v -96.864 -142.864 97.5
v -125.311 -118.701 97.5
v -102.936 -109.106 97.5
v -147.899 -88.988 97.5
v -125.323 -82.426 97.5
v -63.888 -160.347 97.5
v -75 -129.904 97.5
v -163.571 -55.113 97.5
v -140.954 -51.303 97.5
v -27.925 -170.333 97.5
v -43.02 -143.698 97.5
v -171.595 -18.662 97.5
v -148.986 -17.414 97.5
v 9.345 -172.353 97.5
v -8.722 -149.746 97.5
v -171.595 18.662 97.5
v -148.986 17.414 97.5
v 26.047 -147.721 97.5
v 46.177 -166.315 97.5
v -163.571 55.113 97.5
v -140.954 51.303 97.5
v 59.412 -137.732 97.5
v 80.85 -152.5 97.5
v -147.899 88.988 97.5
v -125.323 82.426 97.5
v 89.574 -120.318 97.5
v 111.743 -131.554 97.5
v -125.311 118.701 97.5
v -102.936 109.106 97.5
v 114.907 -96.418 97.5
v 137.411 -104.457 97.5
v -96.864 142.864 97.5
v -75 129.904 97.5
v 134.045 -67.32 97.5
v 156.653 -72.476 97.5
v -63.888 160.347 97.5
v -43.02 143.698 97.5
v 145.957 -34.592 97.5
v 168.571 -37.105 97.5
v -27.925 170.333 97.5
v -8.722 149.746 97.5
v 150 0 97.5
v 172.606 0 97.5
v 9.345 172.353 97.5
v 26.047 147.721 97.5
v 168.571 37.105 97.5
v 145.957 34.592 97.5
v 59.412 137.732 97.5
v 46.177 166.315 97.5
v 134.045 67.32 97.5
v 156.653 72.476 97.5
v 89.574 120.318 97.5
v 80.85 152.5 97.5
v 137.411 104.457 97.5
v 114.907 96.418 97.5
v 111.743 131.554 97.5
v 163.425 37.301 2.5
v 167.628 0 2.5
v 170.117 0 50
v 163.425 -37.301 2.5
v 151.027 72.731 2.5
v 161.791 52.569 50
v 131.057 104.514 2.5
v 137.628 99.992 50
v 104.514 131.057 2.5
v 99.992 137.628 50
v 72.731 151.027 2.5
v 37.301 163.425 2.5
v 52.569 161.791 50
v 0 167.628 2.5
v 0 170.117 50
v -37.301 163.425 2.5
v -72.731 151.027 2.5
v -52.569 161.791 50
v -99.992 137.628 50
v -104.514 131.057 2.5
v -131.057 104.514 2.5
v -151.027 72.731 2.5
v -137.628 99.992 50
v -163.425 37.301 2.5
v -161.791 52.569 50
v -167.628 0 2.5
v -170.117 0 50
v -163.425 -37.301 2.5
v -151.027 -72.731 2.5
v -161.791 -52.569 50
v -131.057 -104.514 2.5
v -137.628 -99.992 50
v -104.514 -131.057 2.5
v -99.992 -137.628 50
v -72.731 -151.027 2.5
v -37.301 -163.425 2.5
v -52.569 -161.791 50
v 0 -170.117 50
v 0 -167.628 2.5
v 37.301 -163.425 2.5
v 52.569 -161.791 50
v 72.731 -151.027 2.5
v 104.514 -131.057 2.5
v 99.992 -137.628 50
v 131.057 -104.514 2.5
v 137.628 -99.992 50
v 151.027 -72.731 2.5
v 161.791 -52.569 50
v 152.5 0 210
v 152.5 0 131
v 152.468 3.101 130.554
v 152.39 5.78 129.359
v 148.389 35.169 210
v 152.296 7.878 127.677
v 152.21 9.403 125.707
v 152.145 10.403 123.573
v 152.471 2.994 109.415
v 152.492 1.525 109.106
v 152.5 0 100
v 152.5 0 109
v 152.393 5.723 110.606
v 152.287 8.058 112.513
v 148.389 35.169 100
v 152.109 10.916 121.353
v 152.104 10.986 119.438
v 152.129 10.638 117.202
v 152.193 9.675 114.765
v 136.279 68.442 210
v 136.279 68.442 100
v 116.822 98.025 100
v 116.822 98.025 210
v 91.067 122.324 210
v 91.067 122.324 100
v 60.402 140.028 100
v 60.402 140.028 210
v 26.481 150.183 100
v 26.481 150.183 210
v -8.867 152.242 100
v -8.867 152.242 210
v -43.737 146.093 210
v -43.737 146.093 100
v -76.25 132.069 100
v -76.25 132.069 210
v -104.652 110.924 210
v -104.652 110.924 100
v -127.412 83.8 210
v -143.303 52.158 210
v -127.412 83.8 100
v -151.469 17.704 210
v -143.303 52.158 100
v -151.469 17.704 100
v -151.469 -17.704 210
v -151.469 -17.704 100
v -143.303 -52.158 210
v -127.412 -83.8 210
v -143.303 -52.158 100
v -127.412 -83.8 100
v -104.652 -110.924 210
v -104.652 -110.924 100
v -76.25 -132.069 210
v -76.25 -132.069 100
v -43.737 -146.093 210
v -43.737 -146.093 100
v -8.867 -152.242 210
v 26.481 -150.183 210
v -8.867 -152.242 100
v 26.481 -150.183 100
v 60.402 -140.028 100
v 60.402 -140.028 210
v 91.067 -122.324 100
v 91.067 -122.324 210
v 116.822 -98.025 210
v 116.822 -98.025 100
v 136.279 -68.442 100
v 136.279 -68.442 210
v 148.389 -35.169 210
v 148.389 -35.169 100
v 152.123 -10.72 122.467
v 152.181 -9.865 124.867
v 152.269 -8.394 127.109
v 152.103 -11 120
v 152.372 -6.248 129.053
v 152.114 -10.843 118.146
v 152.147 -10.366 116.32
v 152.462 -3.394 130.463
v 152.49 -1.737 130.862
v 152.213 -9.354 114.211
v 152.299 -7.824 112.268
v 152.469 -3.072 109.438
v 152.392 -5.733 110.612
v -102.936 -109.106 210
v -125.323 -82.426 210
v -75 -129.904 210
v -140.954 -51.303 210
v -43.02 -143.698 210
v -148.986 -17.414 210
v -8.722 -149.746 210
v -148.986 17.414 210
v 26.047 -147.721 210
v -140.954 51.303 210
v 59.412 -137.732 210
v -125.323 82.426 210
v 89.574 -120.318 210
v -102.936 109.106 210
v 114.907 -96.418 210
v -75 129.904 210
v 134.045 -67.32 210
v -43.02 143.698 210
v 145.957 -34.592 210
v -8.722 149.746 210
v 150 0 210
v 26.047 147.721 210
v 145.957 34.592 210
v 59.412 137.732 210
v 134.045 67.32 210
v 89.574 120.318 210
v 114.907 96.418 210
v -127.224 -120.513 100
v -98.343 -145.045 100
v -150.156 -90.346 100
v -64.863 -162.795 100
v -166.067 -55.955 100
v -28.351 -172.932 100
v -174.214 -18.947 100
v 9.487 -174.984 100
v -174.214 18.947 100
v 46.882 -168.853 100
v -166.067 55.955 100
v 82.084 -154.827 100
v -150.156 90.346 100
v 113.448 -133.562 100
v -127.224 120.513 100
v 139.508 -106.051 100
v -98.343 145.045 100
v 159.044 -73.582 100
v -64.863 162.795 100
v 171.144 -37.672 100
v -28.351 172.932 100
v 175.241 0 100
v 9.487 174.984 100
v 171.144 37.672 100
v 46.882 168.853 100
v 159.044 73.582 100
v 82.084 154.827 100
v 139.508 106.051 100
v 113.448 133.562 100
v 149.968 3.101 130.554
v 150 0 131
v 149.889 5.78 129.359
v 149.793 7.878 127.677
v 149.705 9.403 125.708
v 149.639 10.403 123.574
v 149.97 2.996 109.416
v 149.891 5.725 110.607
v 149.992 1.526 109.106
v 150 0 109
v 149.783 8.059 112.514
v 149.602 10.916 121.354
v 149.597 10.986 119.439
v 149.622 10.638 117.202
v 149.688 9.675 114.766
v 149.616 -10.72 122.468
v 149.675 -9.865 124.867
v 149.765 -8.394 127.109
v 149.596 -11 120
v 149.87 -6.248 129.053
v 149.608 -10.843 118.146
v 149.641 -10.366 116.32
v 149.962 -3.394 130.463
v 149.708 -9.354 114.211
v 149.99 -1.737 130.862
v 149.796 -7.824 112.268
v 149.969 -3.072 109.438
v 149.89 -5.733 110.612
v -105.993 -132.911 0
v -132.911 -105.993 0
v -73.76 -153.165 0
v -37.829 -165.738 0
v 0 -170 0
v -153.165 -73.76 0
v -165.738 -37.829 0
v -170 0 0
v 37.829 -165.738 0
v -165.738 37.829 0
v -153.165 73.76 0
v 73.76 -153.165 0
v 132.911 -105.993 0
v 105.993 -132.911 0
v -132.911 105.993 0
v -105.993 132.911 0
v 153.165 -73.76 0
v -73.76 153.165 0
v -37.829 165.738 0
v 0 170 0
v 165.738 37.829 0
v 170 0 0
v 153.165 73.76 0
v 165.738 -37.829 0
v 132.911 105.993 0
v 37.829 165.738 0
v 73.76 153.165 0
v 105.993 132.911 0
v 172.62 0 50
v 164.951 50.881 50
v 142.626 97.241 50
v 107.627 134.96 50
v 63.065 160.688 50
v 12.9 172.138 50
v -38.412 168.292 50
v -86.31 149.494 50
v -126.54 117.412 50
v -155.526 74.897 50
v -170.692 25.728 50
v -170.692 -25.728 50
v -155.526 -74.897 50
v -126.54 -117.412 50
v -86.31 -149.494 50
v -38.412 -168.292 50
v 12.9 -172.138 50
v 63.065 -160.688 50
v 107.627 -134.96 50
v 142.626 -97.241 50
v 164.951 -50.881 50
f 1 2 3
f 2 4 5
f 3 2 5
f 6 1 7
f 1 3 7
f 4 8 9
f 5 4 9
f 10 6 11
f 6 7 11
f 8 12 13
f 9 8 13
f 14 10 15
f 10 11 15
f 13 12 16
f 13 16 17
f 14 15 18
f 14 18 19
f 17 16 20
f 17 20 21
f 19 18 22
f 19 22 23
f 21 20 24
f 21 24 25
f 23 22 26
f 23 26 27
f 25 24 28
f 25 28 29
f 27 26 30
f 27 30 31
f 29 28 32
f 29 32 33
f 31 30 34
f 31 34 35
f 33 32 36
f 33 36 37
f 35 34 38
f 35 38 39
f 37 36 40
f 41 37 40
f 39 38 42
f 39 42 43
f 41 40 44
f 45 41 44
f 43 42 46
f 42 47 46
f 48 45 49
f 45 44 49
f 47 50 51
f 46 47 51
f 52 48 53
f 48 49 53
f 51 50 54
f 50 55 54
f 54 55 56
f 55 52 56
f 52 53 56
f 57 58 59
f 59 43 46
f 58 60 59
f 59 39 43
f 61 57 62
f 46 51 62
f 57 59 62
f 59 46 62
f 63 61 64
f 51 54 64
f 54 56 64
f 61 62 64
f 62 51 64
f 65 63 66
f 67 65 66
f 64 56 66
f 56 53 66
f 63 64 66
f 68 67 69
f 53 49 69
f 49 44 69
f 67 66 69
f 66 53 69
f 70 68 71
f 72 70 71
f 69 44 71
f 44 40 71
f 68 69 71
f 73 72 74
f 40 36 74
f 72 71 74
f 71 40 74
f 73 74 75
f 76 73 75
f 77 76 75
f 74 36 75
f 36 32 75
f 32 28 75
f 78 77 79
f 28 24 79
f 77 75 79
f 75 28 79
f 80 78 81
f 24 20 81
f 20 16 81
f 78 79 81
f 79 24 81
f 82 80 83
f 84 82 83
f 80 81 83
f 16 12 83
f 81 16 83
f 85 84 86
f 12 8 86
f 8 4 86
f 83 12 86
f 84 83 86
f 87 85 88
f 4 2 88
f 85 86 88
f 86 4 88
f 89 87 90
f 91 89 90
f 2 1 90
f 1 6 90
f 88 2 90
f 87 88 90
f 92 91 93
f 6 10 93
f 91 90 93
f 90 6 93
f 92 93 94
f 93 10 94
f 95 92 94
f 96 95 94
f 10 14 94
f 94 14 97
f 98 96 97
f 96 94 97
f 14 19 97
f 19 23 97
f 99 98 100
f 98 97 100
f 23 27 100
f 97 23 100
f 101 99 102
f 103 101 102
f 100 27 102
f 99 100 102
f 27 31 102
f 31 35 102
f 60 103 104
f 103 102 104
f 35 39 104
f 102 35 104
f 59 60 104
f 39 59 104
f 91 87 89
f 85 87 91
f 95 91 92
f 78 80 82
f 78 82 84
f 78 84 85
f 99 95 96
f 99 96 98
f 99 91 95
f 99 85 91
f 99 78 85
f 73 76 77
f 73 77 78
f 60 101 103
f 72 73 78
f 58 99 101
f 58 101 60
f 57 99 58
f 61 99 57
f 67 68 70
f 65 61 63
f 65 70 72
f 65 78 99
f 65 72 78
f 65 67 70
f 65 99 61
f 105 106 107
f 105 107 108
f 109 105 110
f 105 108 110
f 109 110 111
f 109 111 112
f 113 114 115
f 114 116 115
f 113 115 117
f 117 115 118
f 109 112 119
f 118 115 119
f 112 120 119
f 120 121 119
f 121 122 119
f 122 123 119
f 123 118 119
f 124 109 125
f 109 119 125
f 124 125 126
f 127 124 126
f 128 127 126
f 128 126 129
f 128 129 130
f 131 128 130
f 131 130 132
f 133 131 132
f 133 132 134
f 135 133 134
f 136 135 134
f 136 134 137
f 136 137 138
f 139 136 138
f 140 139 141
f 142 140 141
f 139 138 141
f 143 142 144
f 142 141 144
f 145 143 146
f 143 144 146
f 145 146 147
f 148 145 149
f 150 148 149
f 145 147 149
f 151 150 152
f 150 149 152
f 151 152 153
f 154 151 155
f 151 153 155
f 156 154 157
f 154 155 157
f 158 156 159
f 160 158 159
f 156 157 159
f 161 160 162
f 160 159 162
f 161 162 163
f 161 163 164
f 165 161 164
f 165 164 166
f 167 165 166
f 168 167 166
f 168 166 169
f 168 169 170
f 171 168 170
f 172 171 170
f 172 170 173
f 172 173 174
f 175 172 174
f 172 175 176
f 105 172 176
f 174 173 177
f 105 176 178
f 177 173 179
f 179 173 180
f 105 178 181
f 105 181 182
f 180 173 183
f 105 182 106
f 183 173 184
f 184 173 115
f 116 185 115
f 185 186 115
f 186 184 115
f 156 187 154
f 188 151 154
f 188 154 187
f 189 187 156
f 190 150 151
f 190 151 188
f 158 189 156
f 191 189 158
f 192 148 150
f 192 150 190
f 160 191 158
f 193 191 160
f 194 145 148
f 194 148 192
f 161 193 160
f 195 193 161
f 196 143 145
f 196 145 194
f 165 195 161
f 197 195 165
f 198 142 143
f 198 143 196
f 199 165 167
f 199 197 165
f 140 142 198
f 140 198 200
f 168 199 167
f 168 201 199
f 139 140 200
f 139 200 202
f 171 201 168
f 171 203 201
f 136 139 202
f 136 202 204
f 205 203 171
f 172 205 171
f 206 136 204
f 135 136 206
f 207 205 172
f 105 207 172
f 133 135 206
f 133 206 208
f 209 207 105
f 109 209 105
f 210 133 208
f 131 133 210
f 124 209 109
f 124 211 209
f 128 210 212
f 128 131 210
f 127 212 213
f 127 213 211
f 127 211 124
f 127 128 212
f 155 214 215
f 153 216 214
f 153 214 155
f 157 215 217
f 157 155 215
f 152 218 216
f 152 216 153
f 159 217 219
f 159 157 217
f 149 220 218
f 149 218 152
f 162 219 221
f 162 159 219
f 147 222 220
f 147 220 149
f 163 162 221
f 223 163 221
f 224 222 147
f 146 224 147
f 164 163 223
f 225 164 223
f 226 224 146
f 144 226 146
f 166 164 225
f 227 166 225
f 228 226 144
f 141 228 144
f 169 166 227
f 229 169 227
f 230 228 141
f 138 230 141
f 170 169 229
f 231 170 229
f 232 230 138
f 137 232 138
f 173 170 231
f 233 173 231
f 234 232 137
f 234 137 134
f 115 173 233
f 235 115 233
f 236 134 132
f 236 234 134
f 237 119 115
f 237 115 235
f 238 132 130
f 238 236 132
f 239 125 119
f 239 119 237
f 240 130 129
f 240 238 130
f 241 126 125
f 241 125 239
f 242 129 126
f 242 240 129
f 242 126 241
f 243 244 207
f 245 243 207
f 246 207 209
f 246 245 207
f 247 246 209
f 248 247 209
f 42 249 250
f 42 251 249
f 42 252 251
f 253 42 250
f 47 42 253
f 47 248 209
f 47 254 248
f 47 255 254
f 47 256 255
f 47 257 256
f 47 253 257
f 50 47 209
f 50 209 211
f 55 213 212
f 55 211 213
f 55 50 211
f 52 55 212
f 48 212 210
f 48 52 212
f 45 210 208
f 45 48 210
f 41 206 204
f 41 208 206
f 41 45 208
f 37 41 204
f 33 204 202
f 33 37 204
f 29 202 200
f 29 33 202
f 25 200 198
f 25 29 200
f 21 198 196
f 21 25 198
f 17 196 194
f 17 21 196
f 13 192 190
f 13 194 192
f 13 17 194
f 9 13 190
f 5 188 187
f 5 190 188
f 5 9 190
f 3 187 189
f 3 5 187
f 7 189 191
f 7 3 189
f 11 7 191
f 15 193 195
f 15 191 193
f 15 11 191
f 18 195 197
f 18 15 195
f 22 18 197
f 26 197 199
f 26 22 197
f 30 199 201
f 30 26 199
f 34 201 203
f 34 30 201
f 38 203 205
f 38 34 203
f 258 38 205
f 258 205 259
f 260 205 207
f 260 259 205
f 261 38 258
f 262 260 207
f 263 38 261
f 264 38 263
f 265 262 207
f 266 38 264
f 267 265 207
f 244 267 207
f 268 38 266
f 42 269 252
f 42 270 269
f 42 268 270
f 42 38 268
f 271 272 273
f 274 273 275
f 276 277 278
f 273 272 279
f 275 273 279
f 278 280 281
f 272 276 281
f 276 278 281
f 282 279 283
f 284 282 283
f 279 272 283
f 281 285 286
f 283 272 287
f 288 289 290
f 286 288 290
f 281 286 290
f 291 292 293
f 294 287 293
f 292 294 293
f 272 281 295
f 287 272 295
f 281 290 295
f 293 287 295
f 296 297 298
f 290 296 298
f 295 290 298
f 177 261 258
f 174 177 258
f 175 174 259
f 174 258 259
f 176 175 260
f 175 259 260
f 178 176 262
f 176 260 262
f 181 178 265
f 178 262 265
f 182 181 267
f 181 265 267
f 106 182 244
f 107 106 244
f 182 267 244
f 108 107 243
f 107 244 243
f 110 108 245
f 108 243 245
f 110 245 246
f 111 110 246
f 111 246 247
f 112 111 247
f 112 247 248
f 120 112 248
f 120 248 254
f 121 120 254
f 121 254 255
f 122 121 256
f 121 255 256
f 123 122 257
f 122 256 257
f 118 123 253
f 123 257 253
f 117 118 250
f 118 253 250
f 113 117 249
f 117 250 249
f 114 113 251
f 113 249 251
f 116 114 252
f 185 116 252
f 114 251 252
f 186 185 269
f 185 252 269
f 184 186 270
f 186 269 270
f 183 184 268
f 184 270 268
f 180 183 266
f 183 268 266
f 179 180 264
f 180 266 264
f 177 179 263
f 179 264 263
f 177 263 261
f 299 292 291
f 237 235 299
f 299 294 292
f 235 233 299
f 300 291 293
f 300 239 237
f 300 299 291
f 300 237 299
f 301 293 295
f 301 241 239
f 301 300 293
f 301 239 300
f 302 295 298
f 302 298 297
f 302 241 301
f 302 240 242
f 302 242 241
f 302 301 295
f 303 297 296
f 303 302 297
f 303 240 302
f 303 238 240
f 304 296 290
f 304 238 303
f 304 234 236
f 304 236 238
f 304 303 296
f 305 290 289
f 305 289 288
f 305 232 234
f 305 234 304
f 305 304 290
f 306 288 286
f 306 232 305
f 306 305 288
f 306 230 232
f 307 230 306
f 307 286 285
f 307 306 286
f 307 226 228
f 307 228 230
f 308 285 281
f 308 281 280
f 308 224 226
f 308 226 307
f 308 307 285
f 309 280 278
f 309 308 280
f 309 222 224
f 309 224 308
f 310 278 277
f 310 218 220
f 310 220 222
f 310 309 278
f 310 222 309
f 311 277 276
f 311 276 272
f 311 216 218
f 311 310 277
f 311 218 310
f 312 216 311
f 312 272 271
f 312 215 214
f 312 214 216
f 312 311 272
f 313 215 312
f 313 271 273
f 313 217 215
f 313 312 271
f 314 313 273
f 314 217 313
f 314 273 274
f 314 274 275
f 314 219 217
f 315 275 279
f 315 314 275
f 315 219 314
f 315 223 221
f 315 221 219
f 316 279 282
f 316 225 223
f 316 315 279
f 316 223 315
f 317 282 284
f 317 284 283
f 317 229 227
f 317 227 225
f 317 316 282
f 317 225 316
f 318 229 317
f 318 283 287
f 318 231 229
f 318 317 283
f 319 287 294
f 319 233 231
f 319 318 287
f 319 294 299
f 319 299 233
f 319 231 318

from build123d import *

# Parameters (mm, degrees)
F0_R     = 170
F1_DEPTH = 100
F1_TAPER = -3
F7_R     = 152.5
F2_DEPTH = 110
F4_T     = -2.5
F6_D     = 22
F6_DEPTH = 200
F6_START = 47.8972388
F6_TIP   = 6.6094668093


with BuildPart() as f1:
    # F0 (on Top) → F1 (new body)
    with BuildSketch(Plane.XY):
        Circle(F0_R)
    extrude(amount=F1_DEPTH, taper=F1_TAPER)

    # F7 (on face) → F2 (join)
    with BuildSketch(Plane.XY.offset(100)):
        Circle(F7_R)
    extrude(amount=F2_DEPTH)

    # F4
    f4_openings = [f1.faces().sort_by_distance(p)[0] for p in [
        (0, 0, 210),
    ]]
    offset(amount=F4_T, openings=f4_openings, kind=Kind.INTERSECTION)

    # F6
    # its depths count from where the whole tool has entered the part; down to there all is cleared
    with Locations(Plane.YZ.offset(200).offset(-F6_START)):
        with Locations((0, 120)):
            Hole(F6_D / 2, depth=F6_DEPTH)
            with Locations((0, 0, -(F6_DEPTH + F6_TIP / 2))):  # 118° drill point
                Cone(0, F6_D / 2, F6_TIP, mode=Mode.SUBTRACT)


solid = f1.part
